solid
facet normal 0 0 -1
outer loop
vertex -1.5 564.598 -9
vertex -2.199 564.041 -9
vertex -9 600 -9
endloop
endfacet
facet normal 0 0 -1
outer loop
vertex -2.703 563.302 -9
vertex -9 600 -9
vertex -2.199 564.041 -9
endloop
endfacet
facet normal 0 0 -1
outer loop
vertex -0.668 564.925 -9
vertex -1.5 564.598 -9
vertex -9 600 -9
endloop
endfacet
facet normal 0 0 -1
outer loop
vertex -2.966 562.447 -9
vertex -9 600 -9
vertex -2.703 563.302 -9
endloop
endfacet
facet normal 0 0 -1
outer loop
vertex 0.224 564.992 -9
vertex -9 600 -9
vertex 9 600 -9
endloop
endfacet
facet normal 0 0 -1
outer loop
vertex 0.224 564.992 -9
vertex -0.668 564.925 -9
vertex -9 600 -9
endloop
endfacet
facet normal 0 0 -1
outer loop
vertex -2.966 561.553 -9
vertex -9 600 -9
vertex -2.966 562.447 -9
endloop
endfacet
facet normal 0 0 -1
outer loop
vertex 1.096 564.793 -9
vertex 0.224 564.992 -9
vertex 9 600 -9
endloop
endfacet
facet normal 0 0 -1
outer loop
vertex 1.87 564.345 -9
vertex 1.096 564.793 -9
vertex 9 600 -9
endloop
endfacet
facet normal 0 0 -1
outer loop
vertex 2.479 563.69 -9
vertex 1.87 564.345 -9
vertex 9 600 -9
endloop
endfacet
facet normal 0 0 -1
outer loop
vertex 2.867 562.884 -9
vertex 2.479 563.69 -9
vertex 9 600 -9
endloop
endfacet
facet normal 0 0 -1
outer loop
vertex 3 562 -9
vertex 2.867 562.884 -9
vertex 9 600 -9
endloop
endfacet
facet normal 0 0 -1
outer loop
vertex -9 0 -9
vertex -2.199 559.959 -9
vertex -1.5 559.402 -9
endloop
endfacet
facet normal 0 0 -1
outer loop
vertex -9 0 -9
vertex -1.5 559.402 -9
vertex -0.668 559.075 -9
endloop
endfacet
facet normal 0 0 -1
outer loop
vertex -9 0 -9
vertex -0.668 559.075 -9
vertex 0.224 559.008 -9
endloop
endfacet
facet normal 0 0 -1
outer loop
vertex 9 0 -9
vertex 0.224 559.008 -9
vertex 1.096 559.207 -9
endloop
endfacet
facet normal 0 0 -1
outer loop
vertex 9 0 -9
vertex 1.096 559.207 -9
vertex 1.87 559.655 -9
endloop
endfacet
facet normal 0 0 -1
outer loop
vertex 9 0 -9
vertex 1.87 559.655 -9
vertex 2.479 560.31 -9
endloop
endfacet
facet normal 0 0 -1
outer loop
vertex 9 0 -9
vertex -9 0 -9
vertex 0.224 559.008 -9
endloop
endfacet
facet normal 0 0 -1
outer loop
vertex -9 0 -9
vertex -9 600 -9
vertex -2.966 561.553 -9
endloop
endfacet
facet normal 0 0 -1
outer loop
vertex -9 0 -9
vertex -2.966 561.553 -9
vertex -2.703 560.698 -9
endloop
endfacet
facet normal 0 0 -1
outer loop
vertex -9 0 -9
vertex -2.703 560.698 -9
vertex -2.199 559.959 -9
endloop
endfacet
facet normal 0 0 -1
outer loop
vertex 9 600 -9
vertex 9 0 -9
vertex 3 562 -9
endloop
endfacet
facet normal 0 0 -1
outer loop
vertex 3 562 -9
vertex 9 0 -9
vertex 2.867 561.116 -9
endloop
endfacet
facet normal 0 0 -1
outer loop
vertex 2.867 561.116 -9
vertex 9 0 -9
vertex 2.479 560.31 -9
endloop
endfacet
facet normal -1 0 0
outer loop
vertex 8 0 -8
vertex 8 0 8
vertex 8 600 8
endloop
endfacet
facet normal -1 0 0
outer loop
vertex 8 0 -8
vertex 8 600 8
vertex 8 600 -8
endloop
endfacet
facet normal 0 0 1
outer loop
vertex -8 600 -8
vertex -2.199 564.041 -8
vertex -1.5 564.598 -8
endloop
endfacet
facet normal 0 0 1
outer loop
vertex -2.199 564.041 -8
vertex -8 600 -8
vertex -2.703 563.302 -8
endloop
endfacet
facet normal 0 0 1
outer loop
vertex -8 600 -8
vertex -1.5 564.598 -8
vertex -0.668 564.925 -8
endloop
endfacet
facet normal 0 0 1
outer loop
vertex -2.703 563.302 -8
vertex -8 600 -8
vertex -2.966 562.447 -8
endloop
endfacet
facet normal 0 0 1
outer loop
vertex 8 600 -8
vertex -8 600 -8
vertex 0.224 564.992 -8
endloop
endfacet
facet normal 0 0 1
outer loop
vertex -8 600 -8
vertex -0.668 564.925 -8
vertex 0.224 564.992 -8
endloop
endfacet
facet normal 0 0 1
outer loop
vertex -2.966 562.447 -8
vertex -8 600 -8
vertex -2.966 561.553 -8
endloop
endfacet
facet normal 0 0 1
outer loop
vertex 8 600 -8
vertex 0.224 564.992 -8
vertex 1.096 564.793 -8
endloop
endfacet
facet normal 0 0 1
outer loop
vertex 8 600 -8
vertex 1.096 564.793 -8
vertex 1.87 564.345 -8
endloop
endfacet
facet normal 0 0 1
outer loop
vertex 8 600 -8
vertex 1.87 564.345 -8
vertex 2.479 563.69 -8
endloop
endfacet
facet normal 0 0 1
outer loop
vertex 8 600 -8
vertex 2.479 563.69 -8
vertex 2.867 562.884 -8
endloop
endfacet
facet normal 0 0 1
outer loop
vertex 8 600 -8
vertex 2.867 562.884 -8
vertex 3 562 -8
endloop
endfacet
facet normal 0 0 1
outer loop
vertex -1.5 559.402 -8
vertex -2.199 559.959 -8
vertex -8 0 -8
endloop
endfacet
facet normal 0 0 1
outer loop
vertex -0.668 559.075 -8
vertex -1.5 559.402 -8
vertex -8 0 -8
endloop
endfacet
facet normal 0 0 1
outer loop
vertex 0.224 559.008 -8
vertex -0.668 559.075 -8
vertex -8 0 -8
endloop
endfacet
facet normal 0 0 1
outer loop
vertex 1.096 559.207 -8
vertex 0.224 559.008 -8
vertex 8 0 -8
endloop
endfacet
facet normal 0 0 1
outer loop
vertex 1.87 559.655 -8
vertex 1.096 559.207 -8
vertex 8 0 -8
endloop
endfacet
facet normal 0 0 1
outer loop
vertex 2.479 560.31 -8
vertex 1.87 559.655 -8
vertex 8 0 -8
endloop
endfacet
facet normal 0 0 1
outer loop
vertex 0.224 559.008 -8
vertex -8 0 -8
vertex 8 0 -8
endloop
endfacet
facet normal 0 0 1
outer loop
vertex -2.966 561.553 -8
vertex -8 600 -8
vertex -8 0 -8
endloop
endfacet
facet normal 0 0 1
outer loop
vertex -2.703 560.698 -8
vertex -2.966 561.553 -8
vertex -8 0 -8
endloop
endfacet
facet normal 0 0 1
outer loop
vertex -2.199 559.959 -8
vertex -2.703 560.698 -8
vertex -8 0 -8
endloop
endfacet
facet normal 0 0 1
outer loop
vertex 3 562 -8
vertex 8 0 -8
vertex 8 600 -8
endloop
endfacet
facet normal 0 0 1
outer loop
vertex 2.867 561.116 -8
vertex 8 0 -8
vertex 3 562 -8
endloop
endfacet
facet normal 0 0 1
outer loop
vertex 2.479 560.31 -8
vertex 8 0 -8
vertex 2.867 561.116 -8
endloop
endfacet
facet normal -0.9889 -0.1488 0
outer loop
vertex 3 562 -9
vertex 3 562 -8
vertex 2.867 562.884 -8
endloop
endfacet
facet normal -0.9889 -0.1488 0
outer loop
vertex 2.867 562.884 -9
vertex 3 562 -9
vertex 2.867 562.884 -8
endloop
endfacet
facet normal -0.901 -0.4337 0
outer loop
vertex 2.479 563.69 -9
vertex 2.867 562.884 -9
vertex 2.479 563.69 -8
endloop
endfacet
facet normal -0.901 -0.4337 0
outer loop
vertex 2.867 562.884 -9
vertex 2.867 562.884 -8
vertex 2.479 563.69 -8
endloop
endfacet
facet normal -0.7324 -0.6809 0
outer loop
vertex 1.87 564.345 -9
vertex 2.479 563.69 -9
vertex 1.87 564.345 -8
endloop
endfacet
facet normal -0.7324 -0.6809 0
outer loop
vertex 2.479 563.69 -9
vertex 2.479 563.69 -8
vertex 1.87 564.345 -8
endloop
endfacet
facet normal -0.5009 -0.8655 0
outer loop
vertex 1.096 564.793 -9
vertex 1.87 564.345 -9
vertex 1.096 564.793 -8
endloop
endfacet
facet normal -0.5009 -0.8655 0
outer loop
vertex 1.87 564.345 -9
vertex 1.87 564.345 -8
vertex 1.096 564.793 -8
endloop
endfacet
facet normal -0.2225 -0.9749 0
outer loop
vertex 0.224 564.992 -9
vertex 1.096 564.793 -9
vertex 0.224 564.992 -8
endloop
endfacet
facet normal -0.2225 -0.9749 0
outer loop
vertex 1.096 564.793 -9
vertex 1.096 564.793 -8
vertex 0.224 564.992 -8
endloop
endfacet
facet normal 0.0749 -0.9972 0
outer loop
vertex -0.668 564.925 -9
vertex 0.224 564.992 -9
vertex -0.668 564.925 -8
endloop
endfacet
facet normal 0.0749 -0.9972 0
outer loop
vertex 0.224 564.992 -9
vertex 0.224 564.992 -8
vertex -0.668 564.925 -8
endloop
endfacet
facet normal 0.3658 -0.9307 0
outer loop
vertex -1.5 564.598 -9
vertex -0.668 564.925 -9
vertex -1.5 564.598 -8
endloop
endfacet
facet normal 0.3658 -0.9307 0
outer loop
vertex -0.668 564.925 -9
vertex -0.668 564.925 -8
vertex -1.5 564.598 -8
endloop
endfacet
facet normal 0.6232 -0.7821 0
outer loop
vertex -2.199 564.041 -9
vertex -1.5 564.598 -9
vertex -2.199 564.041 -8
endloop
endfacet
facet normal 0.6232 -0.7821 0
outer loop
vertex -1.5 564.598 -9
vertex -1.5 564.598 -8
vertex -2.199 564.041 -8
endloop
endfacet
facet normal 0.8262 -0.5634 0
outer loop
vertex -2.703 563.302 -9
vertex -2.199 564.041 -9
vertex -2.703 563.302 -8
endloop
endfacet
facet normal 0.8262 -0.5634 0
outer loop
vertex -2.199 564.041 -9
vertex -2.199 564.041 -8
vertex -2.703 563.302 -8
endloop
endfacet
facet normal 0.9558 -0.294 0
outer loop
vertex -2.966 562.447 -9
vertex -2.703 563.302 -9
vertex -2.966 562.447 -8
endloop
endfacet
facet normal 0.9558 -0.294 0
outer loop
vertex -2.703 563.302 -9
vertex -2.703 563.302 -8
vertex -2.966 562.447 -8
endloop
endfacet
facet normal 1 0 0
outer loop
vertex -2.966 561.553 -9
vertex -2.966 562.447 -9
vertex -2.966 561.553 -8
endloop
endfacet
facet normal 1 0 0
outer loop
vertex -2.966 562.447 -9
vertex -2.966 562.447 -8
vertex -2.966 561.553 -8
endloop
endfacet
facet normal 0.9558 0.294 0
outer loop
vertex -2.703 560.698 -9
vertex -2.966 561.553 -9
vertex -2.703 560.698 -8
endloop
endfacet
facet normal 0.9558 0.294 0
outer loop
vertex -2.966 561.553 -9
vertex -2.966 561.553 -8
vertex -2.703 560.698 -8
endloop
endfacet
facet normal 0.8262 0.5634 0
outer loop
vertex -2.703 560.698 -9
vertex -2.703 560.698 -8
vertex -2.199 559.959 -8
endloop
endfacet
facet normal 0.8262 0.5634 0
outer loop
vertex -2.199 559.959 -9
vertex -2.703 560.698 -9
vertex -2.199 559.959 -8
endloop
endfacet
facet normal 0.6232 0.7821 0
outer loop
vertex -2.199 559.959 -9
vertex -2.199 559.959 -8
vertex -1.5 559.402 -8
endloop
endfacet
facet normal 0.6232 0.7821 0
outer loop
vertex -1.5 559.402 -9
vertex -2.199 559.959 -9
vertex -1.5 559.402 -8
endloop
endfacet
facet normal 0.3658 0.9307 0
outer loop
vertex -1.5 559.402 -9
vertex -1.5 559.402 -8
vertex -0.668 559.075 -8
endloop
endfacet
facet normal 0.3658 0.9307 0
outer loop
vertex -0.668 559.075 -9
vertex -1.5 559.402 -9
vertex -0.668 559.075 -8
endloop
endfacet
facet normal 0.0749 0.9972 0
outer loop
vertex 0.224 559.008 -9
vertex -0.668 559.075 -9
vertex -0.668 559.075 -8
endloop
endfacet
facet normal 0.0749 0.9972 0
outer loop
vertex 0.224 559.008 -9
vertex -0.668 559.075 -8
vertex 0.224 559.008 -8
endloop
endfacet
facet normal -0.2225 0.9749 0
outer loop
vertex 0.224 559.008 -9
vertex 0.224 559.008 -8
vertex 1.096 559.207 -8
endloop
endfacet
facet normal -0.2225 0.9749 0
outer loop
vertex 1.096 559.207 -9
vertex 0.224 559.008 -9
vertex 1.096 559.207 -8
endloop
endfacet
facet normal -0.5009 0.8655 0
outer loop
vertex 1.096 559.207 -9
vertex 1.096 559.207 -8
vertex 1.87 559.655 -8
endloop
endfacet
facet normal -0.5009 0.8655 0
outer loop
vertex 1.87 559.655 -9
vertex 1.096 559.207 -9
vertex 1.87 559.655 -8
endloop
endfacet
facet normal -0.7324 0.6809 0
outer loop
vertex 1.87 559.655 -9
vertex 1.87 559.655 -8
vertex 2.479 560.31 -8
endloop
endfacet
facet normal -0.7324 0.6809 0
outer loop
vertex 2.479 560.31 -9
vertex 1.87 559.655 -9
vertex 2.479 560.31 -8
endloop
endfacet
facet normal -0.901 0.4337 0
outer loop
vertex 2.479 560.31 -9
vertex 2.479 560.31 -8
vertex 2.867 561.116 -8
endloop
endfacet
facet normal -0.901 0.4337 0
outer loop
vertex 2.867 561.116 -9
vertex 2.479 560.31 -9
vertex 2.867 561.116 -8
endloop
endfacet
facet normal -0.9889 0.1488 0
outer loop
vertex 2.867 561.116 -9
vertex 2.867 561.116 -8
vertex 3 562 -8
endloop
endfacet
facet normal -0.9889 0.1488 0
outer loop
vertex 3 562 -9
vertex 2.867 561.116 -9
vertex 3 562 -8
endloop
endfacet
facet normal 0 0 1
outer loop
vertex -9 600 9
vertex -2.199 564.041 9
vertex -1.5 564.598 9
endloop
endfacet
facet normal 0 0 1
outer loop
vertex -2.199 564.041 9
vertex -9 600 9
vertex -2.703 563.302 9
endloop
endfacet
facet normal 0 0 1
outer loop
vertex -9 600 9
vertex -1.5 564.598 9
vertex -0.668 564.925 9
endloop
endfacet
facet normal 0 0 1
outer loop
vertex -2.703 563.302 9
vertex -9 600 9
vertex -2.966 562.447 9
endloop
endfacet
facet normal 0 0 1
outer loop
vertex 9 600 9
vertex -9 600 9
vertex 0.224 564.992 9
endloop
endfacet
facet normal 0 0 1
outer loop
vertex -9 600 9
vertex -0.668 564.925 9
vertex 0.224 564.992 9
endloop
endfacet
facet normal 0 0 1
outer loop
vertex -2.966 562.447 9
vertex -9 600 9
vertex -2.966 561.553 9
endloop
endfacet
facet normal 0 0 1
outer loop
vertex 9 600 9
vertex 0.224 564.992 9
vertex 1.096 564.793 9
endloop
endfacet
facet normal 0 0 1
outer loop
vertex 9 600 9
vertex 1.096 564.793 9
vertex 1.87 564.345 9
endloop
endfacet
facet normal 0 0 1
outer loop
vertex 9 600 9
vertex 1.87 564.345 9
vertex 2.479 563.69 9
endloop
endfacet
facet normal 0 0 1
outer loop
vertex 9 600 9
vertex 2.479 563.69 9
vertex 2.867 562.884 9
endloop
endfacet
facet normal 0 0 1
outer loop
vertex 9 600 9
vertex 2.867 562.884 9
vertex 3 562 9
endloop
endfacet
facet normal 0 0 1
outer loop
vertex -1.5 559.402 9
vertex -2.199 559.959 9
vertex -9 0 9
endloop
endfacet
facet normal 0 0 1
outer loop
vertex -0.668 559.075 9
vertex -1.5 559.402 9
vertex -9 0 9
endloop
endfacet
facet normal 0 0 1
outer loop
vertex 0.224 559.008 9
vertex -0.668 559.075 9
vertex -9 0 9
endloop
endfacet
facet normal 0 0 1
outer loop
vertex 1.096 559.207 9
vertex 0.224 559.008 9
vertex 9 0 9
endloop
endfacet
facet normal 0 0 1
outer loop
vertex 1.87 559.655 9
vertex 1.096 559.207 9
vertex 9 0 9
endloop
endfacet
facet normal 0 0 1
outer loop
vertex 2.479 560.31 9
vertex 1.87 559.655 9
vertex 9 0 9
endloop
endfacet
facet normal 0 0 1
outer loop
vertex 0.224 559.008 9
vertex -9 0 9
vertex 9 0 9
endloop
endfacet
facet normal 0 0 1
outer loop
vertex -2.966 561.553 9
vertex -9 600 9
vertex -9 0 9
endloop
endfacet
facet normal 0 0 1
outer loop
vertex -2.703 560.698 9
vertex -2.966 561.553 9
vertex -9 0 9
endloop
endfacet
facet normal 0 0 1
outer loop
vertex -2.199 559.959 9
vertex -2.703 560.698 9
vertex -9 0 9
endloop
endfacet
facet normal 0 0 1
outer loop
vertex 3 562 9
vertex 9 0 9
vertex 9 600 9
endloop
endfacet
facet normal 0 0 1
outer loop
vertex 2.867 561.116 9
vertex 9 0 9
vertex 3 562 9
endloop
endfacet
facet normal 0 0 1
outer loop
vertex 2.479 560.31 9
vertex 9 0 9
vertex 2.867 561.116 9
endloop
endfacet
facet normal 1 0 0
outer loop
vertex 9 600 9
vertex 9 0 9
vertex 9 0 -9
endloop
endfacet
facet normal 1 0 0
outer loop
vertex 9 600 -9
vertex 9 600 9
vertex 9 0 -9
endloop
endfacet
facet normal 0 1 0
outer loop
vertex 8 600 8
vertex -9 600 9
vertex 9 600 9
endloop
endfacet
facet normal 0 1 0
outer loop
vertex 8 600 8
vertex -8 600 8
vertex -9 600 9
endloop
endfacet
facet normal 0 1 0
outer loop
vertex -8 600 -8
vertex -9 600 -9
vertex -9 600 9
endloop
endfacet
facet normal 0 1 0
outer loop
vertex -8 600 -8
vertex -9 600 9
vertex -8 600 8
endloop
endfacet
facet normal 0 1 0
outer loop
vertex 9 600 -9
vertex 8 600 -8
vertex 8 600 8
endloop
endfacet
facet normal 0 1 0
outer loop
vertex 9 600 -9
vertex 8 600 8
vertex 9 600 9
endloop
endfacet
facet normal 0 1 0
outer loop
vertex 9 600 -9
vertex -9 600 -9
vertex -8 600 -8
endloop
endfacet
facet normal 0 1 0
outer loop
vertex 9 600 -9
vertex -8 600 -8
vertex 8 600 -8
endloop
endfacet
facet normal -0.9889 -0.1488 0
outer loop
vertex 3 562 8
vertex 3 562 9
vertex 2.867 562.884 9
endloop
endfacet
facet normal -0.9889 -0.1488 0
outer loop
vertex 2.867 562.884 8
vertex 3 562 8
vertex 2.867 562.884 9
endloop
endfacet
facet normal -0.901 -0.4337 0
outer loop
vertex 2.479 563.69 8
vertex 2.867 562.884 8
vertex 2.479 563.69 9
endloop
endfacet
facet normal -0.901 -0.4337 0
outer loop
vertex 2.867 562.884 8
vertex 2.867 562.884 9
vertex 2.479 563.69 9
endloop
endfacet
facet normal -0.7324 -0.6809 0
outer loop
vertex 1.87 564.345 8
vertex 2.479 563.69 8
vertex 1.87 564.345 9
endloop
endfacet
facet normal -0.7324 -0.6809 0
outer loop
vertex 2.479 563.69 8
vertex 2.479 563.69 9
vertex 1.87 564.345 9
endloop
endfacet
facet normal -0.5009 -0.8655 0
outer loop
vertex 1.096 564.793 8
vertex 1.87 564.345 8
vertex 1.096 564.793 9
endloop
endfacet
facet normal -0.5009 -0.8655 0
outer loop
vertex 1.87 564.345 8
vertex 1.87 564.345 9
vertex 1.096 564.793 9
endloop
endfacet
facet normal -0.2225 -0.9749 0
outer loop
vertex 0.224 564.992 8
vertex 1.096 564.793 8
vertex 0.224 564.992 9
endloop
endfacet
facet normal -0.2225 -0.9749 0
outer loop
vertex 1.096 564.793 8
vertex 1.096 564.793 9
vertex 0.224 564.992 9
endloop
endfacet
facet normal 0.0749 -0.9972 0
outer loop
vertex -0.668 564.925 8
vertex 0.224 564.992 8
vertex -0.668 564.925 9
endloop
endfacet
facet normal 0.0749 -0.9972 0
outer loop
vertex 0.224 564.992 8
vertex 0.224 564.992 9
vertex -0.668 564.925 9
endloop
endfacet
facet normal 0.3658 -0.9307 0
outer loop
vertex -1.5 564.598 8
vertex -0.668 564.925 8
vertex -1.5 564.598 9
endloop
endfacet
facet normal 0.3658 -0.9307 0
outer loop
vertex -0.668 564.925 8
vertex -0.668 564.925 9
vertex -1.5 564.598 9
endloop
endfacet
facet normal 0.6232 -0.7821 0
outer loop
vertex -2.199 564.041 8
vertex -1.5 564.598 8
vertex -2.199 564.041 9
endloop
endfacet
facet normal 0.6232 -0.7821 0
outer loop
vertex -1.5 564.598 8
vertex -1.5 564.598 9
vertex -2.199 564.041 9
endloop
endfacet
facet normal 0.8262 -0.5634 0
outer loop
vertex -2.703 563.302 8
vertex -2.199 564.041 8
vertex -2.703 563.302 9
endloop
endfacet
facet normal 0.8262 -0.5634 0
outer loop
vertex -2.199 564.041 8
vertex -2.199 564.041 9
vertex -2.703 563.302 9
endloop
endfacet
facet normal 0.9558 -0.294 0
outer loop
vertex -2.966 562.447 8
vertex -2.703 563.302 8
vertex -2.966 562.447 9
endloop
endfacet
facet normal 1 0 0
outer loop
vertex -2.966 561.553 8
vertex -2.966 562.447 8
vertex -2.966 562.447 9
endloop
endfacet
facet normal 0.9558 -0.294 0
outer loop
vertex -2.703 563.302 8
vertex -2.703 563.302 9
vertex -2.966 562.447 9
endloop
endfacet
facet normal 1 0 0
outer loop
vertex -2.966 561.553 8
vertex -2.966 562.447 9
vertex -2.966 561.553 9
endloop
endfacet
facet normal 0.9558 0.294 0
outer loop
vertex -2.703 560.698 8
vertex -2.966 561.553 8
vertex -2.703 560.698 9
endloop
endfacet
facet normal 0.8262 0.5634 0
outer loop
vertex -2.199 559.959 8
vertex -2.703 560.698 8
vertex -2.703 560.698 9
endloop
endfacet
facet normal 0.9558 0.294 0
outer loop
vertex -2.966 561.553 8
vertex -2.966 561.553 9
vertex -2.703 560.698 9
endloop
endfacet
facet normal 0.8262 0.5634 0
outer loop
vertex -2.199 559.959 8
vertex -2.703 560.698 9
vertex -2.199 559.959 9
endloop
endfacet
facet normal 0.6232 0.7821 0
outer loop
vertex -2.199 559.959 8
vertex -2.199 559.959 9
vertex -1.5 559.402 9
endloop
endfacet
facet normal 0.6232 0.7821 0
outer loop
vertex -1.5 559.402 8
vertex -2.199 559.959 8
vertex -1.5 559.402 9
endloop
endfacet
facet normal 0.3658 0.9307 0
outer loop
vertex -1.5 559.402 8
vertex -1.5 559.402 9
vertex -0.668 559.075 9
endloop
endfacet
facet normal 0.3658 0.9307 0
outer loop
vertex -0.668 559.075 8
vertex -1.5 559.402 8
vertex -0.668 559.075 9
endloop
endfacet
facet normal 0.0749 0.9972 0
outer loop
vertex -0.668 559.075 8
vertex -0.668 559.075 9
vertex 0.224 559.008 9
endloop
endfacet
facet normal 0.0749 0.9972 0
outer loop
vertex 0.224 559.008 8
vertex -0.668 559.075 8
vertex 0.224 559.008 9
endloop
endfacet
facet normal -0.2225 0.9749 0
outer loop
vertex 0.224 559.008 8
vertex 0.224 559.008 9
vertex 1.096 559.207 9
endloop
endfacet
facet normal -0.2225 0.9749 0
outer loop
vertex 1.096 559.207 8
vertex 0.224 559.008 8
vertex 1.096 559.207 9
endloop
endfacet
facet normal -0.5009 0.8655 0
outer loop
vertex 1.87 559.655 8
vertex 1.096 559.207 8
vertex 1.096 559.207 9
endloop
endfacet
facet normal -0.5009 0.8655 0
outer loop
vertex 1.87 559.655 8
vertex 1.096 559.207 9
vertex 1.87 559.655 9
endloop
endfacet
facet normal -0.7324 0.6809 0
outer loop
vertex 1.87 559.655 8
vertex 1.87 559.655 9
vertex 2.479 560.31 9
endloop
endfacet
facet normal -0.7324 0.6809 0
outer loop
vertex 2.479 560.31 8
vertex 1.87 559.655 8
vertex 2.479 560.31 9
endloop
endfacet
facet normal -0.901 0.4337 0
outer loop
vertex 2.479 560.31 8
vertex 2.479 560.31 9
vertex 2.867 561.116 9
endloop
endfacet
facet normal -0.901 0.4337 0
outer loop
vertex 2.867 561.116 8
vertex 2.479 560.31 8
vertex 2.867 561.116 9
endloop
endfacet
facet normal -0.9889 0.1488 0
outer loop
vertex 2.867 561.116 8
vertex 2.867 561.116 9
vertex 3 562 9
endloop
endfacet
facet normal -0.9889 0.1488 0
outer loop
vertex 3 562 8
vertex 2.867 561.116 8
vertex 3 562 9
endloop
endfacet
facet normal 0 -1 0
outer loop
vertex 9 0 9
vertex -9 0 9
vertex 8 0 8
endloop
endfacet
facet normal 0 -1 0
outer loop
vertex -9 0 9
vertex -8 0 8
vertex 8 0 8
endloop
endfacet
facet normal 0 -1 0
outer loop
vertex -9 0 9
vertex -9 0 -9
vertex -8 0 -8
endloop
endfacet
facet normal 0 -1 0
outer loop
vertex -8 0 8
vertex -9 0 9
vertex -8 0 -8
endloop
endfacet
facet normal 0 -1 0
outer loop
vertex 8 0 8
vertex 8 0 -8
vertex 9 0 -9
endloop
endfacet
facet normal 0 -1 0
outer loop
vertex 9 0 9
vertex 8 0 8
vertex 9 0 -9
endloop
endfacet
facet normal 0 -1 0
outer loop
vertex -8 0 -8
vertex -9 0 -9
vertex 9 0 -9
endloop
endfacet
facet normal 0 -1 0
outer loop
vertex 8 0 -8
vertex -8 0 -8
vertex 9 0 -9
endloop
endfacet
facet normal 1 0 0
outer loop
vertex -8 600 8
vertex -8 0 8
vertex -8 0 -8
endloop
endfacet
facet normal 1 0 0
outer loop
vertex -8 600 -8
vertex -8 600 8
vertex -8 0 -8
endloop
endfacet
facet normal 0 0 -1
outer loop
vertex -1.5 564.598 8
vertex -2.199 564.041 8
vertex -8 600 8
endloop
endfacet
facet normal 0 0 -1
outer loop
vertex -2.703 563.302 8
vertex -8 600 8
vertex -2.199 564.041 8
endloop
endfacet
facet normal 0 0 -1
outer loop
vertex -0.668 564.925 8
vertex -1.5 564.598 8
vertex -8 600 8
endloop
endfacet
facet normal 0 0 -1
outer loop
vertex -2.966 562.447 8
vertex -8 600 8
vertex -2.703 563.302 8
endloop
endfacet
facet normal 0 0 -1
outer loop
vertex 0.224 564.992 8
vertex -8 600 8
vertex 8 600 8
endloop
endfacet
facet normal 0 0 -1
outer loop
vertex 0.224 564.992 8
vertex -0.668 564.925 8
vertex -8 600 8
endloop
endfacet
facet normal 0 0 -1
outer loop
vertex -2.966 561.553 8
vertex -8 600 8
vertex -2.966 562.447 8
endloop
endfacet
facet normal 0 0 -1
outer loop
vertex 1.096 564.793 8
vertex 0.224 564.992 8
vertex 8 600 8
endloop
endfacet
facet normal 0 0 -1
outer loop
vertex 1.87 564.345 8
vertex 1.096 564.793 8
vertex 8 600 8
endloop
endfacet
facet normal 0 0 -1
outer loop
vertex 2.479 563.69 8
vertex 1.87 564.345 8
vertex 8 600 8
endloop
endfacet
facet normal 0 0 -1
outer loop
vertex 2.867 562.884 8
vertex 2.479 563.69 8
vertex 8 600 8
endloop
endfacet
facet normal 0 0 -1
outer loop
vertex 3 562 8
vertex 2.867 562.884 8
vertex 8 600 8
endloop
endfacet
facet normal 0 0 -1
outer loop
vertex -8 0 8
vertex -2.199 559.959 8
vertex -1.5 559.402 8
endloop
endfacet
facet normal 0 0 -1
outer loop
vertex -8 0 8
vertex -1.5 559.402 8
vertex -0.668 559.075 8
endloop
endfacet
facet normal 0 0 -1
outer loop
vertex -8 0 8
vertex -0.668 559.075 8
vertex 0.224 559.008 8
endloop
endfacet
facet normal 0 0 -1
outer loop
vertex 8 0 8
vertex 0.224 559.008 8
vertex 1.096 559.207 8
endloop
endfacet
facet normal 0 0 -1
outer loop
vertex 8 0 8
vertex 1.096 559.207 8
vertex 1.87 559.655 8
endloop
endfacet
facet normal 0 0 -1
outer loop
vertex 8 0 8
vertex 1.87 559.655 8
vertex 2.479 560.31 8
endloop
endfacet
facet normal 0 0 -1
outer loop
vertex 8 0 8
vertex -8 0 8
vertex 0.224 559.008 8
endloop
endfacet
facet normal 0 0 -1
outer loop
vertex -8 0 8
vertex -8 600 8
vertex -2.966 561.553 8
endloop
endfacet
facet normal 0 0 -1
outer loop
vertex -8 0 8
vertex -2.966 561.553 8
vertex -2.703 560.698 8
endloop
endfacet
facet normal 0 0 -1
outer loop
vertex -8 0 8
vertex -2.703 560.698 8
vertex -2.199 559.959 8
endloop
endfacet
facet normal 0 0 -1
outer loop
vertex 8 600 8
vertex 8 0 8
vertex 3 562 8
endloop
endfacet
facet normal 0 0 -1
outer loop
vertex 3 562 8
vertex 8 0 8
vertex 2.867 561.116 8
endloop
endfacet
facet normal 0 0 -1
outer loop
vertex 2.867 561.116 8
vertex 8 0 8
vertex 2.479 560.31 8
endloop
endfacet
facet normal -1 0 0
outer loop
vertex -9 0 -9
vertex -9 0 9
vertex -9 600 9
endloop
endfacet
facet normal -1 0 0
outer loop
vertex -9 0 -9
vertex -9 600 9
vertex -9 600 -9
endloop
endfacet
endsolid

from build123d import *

# Parameters (mm, degrees)
SKETCH1_W           = 18
SKETCH1_H           = 18
SKETCH1_W_2         = 16
SKETCH1_H_2         = 16
BOSS_EXTRUDE1_DEPTH = 600
SKETCH2_R           = 3
CUT_EXTRUDE1_DEPTH  = 993


with BuildPart() as part:
    # Sketch1 → Boss-Extrude1 (new body)
    with BuildSketch(Plane(origin=(0, 0, 0), x_dir=(1, 0, 0), z_dir=(0, 1, 0))):
        Rectangle(SKETCH1_W, SKETCH1_H)
        Rectangle(SKETCH1_W_2, SKETCH1_H_2, mode=Mode.SUBTRACT)
    extrude(amount=BOSS_EXTRUDE1_DEPTH)

    # Sketch2 → Cut-Extrude1 (cut)
    with BuildSketch(Plane.XY.offset(9)):
        with Locations((0, 562)):
            Circle(SKETCH2_R)
    extrude(amount=-CUT_EXTRUDE1_DEPTH, mode=Mode.SUBTRACT)


solid = part.part
